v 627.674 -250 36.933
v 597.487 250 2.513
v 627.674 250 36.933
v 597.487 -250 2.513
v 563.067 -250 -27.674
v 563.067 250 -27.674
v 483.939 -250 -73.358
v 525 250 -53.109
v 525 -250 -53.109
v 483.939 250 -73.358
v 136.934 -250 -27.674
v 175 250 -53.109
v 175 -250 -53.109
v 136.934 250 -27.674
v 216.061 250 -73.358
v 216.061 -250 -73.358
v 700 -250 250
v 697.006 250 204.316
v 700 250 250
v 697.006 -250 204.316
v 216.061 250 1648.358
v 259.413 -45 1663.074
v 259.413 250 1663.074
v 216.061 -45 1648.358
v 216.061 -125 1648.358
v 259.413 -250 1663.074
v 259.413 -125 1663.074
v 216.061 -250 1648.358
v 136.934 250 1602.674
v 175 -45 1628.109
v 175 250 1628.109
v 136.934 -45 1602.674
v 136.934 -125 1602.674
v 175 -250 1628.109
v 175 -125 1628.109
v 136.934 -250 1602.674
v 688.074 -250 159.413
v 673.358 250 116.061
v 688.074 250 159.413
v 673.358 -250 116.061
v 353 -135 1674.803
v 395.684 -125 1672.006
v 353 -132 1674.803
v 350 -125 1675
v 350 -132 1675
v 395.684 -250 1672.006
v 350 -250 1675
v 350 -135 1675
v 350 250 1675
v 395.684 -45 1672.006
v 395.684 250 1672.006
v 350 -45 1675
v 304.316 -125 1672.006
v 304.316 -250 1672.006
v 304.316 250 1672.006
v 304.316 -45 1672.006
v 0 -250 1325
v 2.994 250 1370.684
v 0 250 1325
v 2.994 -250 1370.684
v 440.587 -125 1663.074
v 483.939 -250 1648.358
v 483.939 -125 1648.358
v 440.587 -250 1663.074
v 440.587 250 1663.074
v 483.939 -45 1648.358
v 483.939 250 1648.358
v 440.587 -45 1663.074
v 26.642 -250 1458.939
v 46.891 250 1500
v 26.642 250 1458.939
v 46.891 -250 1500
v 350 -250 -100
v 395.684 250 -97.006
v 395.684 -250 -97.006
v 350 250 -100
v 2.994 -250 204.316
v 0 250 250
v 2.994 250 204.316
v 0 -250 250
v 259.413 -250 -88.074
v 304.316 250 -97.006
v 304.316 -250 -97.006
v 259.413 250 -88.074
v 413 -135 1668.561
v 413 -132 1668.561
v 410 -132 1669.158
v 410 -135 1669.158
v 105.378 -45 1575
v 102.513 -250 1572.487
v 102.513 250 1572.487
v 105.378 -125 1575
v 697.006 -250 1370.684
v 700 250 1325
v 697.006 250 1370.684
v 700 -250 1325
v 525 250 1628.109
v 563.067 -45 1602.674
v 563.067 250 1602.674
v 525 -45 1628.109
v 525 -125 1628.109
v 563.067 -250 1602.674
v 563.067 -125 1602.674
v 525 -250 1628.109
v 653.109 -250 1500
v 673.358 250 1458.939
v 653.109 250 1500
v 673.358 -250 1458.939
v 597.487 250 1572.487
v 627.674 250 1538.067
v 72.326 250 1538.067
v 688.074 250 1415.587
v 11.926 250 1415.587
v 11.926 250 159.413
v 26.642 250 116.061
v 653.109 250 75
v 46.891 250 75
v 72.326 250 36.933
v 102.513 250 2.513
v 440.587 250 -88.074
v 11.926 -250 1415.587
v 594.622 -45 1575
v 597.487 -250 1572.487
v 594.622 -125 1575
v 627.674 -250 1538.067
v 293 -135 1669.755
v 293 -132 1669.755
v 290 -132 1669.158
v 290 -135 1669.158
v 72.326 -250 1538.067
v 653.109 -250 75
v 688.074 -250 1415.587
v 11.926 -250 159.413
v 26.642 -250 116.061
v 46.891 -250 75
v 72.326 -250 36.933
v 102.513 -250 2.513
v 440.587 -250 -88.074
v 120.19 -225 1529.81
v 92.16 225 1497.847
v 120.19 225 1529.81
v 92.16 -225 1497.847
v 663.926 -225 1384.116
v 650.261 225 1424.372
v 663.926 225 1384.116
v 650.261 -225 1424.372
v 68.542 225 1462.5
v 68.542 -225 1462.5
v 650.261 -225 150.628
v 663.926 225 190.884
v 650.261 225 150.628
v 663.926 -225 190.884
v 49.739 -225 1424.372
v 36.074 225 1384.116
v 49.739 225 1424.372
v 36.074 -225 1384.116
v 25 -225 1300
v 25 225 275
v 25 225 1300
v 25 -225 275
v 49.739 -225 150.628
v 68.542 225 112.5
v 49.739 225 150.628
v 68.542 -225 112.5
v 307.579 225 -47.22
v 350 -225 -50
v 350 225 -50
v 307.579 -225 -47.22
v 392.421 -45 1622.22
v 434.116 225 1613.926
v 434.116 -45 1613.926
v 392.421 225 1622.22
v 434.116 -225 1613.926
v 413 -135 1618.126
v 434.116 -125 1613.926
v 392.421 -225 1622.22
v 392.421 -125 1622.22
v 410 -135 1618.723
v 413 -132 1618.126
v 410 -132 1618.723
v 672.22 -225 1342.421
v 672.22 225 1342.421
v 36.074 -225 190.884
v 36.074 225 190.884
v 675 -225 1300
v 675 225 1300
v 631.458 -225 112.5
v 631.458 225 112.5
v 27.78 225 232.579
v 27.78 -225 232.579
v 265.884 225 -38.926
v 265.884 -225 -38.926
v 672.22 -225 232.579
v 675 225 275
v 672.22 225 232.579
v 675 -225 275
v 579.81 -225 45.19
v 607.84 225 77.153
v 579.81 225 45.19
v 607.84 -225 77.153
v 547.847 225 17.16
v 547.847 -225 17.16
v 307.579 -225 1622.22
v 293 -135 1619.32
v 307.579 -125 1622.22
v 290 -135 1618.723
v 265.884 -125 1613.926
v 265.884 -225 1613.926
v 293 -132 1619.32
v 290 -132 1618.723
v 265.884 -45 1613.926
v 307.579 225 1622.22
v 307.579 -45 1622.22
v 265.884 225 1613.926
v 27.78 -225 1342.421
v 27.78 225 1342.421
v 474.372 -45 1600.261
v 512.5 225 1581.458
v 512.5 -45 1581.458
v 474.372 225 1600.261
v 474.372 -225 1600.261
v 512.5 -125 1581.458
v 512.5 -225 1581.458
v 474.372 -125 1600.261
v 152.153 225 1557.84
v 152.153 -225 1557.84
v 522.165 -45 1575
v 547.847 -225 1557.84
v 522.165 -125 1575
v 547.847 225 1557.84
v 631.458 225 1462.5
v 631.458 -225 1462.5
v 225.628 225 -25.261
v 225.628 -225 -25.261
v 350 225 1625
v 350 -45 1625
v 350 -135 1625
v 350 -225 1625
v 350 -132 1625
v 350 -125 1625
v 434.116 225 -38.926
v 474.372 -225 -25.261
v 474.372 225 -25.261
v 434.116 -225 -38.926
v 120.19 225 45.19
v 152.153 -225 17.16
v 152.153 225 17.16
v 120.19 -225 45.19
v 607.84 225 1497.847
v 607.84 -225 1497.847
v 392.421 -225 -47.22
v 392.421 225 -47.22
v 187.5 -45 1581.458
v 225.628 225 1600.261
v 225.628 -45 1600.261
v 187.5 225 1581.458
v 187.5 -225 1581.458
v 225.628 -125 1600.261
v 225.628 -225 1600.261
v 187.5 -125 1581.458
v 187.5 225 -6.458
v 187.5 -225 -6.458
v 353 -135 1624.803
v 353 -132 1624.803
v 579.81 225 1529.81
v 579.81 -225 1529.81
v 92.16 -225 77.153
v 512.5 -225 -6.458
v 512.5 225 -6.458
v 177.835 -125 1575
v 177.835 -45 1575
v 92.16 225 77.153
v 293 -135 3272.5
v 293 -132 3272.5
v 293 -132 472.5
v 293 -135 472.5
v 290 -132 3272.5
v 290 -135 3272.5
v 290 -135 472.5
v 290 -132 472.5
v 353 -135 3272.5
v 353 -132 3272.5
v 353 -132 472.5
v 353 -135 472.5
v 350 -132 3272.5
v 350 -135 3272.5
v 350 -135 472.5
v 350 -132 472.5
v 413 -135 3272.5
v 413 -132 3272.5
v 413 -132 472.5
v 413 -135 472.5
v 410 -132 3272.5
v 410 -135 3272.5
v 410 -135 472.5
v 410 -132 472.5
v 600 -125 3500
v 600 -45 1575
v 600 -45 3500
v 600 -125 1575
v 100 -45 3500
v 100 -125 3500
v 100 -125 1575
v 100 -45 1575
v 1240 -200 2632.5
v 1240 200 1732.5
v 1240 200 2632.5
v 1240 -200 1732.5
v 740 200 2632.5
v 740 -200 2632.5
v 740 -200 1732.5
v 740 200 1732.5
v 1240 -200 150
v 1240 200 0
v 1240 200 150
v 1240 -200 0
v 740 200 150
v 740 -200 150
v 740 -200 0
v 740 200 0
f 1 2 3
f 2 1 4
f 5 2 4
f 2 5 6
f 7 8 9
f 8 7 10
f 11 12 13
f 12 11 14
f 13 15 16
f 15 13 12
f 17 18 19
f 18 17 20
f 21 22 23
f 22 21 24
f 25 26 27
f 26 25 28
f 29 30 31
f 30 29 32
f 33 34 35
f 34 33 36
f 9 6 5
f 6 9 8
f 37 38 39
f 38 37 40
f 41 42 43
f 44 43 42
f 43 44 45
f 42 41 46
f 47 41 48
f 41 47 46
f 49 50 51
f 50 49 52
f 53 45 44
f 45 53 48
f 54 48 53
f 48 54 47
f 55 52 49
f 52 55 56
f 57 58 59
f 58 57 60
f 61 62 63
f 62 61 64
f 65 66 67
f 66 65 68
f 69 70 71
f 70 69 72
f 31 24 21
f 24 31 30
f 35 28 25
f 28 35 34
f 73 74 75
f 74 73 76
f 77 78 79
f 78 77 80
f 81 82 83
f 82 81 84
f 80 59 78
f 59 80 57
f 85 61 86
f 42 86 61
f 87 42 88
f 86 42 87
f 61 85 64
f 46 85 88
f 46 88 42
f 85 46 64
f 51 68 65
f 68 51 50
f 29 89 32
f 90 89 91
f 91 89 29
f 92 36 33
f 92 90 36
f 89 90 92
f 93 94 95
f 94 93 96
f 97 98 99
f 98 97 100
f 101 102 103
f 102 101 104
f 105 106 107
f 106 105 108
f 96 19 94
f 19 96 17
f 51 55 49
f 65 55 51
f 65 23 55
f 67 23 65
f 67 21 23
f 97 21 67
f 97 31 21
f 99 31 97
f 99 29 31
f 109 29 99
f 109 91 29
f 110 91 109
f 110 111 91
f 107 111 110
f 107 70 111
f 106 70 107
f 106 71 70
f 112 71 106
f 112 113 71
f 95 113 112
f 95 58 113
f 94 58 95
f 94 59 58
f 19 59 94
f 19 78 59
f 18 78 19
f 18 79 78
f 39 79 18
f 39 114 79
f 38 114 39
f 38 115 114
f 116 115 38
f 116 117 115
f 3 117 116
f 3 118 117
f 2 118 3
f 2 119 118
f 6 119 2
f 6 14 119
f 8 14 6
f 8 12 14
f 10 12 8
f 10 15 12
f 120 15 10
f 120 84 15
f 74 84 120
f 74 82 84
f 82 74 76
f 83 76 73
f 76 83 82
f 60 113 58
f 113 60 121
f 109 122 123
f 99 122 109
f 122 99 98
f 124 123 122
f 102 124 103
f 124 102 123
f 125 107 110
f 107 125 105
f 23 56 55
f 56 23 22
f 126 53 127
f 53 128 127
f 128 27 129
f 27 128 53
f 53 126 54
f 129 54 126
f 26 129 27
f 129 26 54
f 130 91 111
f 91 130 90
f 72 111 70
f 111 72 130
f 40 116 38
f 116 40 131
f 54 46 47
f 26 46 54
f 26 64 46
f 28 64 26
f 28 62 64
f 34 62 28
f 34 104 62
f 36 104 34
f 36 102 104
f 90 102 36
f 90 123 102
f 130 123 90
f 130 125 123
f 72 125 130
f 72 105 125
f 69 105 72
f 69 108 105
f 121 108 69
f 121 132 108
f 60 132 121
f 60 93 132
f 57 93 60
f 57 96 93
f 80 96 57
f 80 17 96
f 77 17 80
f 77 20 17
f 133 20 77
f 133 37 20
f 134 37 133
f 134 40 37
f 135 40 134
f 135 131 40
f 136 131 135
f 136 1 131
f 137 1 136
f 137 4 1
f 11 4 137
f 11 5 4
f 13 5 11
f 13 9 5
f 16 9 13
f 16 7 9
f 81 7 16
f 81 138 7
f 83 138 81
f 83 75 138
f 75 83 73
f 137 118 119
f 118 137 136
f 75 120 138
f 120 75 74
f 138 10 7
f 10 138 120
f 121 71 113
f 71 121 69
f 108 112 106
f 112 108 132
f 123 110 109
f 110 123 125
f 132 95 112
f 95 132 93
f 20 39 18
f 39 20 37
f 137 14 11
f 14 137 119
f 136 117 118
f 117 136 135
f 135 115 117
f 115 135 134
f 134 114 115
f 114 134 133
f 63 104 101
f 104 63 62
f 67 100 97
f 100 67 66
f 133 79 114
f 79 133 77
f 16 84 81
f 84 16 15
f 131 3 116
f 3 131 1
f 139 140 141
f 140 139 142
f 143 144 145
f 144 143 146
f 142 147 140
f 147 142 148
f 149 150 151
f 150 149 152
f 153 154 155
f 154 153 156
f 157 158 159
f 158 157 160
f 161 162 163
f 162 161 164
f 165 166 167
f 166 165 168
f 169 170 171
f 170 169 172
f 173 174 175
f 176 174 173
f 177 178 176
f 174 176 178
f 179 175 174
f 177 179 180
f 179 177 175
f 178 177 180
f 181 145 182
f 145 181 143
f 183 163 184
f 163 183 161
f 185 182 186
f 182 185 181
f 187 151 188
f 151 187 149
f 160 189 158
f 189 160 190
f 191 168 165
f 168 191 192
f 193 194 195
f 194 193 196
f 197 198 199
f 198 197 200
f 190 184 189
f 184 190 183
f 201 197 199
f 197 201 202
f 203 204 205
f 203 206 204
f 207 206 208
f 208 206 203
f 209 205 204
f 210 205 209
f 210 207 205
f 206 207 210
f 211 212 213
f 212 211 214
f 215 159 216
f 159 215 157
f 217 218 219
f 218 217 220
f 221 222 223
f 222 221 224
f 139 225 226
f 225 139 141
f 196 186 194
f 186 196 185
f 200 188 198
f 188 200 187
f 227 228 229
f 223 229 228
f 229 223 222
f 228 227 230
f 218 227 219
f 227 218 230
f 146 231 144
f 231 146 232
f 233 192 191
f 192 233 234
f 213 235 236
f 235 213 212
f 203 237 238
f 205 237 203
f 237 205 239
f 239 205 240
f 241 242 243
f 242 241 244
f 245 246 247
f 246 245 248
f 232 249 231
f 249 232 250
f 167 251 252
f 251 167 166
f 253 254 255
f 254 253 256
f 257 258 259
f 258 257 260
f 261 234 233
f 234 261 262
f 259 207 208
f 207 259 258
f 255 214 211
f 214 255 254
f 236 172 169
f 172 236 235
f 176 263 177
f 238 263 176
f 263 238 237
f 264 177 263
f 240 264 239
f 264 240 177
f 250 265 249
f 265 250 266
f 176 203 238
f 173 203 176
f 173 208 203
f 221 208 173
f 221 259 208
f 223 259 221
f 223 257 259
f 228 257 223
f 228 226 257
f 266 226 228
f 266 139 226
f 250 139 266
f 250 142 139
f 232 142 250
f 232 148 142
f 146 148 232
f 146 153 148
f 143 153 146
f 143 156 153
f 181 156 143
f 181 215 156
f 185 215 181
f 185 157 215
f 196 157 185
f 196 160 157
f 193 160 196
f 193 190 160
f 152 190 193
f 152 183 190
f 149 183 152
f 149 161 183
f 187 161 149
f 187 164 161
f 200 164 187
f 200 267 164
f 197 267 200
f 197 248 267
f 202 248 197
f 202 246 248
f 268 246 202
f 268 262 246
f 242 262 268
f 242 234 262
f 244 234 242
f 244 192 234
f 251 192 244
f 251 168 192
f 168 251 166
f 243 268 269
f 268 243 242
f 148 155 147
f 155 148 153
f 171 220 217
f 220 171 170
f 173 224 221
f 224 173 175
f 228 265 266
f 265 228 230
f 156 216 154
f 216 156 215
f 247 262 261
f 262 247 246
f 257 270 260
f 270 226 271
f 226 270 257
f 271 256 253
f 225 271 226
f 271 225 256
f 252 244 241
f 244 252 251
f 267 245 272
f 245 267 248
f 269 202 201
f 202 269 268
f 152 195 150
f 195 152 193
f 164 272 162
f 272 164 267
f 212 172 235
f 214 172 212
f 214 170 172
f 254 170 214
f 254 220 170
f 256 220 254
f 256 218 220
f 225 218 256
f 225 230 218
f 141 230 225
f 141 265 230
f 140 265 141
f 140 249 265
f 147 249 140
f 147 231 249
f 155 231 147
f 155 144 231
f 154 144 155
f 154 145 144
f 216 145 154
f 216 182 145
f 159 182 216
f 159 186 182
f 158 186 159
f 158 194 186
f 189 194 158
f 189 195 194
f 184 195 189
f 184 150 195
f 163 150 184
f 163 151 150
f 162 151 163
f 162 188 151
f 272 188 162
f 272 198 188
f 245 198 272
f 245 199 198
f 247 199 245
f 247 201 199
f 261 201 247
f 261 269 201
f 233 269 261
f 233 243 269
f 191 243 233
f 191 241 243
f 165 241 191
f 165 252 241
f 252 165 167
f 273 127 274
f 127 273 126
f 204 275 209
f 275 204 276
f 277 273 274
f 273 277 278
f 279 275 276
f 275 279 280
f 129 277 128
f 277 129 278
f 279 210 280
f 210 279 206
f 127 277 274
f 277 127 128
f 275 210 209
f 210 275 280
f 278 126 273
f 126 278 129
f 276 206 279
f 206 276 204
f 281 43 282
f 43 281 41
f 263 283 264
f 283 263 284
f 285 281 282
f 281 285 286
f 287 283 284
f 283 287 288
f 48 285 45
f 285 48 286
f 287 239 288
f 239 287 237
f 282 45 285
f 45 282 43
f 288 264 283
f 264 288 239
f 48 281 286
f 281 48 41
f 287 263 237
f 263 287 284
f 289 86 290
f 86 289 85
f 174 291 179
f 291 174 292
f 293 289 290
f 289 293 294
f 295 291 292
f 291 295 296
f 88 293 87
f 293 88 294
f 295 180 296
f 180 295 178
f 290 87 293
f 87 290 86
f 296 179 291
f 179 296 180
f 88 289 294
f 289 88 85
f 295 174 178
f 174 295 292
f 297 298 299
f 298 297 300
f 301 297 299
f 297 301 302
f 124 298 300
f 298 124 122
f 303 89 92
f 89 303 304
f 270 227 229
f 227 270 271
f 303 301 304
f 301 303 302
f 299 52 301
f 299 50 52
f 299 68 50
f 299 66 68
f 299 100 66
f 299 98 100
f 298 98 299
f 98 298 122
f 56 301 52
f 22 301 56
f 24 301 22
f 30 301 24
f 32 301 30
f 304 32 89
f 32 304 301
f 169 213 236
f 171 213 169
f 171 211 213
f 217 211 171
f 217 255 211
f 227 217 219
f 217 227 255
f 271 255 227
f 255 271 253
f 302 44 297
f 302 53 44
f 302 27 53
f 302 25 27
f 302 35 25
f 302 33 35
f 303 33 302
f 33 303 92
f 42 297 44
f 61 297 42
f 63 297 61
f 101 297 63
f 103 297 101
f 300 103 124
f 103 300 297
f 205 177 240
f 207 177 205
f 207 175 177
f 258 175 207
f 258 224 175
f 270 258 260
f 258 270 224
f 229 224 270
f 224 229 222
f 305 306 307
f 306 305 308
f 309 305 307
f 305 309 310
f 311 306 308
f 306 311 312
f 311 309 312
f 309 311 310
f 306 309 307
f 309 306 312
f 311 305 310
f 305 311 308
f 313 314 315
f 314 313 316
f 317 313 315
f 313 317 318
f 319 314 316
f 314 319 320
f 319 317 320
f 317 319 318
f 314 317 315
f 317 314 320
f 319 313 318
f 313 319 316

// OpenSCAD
// Octobass — parametric STRUCTURAL-ENVELOPE scaffold (concept-only packet).
//
// Authority: pending_measurement. NOT fabrication authority.
// ---------------------------------------------------------------------------
// HONESTY BOUNDARY (read before using any value here):
//   This packet is deliberately NON-DIMENSIONAL. README.md, design.md,
//   bom.csv, cut-list.csv, and parametric-design.csv release NO absolute
//   dimensions — every parameter (scale_length, linkage_ratio,
//   stop_position_ratio, ...) is `pending_measurement` / "No absolute value
//   assigned". Therefore EVERY numeric leaf value below is a RENDER-ONLY
//   PLACEHOLDER chosen only so the envelope draws; NONE is a design, tuning,
//   force, or fabrication authority. Placeholders are tagged `// PLACEHOLDER`.
//   The DOCUMENTED content this file honestly encodes is the set of SYMBOLIC
//   RELATIONSHIPS from parametric-design.csv (stop_position_ratio,
//   stop_contact_travel, linkage_ratio, lost_motion_budget) — expressed as
//   formulas, not baked values.
//   Mechanism detail (lever/pedal internals, bell-crank geometry, stop contact
//   heads) is intentionally OUT OF SCOPE — see design.md.
// ---------------------------------------------------------------------------
// Units: millimeters.

/* [Overall envelope — overall_height_concept (PLACEHOLDER)] */
overall_height_mm  = 3500;  // PLACEHOLDER giant sub-contrabass height (no value assigned)
body_width_mm      = 700;   // PLACEHOLDER lower-bout width
body_depth_mm      = 500;   // PLACEHOLDER body depth
body_frac          = 0.45;  // PLACEHOLDER body height as fraction of overall
wall_thk_mm        = 25;    // PLACEHOLDER plate/wall thickness

/* [String plan — string_count_concept = 3 (prompt), scale_length PLACEHOLDER] */
string_count       = 3;     // prompt-supplied concept constraint (family)
string_spacing_mm  = 60;    // PLACEHOLDER string spacing at bridge
scale_frac         = 0.8;   // PLACEHOLDER scale length as fraction of overall

/* [Stopping mechanism envelope — parametric-design.csv, all PLACEHOLDER] */
stop_position_ratio   = 0.5;  // PLACEHOLDER stop_position/scale_length (symbolic)
string_clearance_mm   = 20;   // PLACEHOLDER clearance to string
contact_displace_mm   = 15;   // PLACEHOLDER required contact displacement
player_input_travel_mm= 120;  // PLACEHOLDER lever/pedal input travel
lever_bank_height_mm  = 900;  // PLACEHOLDER hand-lever bank envelope height
pedal_bank_depth_mm   = 400;  // PLACEHOLDER foot-pedal bank envelope depth

/* [Frame / bow envelope — PLACEHOLDER] */
frame_width_mm     = 500;   // PLACEHOLDER mechanism support frame width
bow_clear_mm       = 300;   // PLACEHOLDER bow swept clearance envelope

// ---------------------------------------------------------------------------
// Derived geometry — DOCUMENTED symbolic relationships as formulas
// (parametric-design.csv). Honest, source-traceable part of the model.
// ---------------------------------------------------------------------------

scale_length_mm = overall_height_mm * scale_frac;

// stop_position = stop_position_ratio * scale_length.
function stop_position(ratio, scale) = ratio * scale;
stop_pos_mm = stop_position(stop_position_ratio, scale_length_mm);

// stop_contact_travel = clearance_to_string + required_contact_displacement.
function stop_contact_travel(clear, disp) = clear + disp;
stop_travel_mm = stop_contact_travel(string_clearance_mm, contact_displace_mm);

// linkage_ratio = stop_output_travel / player_input_travel.
function linkage_ratio(out, inp) = out / inp;
L_ratio = linkage_ratio(stop_travel_mm, player_input_travel_mm);

// lost_motion_budget = input_motion - effective_stop_motion (placeholder 0.1).
lost_motion_mm = player_input_travel_mm * 0.1;  // PLACEHOLDER 10% budget

body_height_mm = overall_height_mm * body_frac;

module body_shell() {
  // Oversized bowed-bass body near the base of the standing instrument.
  difference() {
    hull() {
      for (z = [body_depth_mm/2, body_height_mm - body_depth_mm/2])
        translate([body_width_mm/2, 0, z])
          rotate([-90,0,0]) cylinder(h = body_depth_mm, r = body_width_mm/2, $fn=48, center=true);
    }
    translate([0, 0, 0])
      hull() {
        for (z = [body_depth_mm/2 + wall_thk_mm, body_height_mm - body_depth_mm/2 - wall_thk_mm])
          translate([body_width_mm/2, 0, z])
            rotate([-90,0,0]) cylinder(h = body_depth_mm - 2*wall_thk_mm, r = body_width_mm/2 - wall_thk_mm, $fn=48, center=true);
      }
  }
}

module neck_and_strings() {
  // Extended neck/support head rising to overall height; 3 string lanes.
  translate([body_width_mm/2 - frame_width_mm/2, -body_depth_mm/4, body_height_mm])
    cube([frame_width_mm, 80, overall_height_mm - body_height_mm]);
  for (i = [0 : string_count-1])
    translate([body_width_mm/2 - (string_count-1)*string_spacing_mm/2 + i*string_spacing_mm,
               -body_depth_mm/4 - 10, body_height_mm*0.3])
      cube([3, 3, scale_length_mm]);   // PLACEHOLDER string standoff
}

module stop_mechanism_envelope() {
  // Lever bank (hand height) + pedal bank (floor) as reserved volumes only.
  translate([body_width_mm + 40, -pedal_bank_depth_mm/2, body_height_mm*1.1])
    cube([frame_width_mm, pedal_bank_depth_mm, lever_bank_height_mm]);   // lever bank
  translate([body_width_mm + 40, -pedal_bank_depth_mm/2, 0])
    cube([frame_width_mm, pedal_bank_depth_mm, 150]);                    // pedal bank
}

module octobass_assembly() {
  body_shell();
  neck_and_strings();
  stop_mechanism_envelope();
}

octobass_assembly();

echo(str("scale_length_mm=", scale_length_mm));
echo(str("stop_pos_mm=", stop_pos_mm));
echo(str("stop_travel_mm=", stop_travel_mm));
echo(str("linkage_ratio=", L_ratio));
echo(str("lost_motion_mm=", lost_motion_mm));
echo("AUTHORITY=pending_measurement; all leaf values are render-only placeholders.");
